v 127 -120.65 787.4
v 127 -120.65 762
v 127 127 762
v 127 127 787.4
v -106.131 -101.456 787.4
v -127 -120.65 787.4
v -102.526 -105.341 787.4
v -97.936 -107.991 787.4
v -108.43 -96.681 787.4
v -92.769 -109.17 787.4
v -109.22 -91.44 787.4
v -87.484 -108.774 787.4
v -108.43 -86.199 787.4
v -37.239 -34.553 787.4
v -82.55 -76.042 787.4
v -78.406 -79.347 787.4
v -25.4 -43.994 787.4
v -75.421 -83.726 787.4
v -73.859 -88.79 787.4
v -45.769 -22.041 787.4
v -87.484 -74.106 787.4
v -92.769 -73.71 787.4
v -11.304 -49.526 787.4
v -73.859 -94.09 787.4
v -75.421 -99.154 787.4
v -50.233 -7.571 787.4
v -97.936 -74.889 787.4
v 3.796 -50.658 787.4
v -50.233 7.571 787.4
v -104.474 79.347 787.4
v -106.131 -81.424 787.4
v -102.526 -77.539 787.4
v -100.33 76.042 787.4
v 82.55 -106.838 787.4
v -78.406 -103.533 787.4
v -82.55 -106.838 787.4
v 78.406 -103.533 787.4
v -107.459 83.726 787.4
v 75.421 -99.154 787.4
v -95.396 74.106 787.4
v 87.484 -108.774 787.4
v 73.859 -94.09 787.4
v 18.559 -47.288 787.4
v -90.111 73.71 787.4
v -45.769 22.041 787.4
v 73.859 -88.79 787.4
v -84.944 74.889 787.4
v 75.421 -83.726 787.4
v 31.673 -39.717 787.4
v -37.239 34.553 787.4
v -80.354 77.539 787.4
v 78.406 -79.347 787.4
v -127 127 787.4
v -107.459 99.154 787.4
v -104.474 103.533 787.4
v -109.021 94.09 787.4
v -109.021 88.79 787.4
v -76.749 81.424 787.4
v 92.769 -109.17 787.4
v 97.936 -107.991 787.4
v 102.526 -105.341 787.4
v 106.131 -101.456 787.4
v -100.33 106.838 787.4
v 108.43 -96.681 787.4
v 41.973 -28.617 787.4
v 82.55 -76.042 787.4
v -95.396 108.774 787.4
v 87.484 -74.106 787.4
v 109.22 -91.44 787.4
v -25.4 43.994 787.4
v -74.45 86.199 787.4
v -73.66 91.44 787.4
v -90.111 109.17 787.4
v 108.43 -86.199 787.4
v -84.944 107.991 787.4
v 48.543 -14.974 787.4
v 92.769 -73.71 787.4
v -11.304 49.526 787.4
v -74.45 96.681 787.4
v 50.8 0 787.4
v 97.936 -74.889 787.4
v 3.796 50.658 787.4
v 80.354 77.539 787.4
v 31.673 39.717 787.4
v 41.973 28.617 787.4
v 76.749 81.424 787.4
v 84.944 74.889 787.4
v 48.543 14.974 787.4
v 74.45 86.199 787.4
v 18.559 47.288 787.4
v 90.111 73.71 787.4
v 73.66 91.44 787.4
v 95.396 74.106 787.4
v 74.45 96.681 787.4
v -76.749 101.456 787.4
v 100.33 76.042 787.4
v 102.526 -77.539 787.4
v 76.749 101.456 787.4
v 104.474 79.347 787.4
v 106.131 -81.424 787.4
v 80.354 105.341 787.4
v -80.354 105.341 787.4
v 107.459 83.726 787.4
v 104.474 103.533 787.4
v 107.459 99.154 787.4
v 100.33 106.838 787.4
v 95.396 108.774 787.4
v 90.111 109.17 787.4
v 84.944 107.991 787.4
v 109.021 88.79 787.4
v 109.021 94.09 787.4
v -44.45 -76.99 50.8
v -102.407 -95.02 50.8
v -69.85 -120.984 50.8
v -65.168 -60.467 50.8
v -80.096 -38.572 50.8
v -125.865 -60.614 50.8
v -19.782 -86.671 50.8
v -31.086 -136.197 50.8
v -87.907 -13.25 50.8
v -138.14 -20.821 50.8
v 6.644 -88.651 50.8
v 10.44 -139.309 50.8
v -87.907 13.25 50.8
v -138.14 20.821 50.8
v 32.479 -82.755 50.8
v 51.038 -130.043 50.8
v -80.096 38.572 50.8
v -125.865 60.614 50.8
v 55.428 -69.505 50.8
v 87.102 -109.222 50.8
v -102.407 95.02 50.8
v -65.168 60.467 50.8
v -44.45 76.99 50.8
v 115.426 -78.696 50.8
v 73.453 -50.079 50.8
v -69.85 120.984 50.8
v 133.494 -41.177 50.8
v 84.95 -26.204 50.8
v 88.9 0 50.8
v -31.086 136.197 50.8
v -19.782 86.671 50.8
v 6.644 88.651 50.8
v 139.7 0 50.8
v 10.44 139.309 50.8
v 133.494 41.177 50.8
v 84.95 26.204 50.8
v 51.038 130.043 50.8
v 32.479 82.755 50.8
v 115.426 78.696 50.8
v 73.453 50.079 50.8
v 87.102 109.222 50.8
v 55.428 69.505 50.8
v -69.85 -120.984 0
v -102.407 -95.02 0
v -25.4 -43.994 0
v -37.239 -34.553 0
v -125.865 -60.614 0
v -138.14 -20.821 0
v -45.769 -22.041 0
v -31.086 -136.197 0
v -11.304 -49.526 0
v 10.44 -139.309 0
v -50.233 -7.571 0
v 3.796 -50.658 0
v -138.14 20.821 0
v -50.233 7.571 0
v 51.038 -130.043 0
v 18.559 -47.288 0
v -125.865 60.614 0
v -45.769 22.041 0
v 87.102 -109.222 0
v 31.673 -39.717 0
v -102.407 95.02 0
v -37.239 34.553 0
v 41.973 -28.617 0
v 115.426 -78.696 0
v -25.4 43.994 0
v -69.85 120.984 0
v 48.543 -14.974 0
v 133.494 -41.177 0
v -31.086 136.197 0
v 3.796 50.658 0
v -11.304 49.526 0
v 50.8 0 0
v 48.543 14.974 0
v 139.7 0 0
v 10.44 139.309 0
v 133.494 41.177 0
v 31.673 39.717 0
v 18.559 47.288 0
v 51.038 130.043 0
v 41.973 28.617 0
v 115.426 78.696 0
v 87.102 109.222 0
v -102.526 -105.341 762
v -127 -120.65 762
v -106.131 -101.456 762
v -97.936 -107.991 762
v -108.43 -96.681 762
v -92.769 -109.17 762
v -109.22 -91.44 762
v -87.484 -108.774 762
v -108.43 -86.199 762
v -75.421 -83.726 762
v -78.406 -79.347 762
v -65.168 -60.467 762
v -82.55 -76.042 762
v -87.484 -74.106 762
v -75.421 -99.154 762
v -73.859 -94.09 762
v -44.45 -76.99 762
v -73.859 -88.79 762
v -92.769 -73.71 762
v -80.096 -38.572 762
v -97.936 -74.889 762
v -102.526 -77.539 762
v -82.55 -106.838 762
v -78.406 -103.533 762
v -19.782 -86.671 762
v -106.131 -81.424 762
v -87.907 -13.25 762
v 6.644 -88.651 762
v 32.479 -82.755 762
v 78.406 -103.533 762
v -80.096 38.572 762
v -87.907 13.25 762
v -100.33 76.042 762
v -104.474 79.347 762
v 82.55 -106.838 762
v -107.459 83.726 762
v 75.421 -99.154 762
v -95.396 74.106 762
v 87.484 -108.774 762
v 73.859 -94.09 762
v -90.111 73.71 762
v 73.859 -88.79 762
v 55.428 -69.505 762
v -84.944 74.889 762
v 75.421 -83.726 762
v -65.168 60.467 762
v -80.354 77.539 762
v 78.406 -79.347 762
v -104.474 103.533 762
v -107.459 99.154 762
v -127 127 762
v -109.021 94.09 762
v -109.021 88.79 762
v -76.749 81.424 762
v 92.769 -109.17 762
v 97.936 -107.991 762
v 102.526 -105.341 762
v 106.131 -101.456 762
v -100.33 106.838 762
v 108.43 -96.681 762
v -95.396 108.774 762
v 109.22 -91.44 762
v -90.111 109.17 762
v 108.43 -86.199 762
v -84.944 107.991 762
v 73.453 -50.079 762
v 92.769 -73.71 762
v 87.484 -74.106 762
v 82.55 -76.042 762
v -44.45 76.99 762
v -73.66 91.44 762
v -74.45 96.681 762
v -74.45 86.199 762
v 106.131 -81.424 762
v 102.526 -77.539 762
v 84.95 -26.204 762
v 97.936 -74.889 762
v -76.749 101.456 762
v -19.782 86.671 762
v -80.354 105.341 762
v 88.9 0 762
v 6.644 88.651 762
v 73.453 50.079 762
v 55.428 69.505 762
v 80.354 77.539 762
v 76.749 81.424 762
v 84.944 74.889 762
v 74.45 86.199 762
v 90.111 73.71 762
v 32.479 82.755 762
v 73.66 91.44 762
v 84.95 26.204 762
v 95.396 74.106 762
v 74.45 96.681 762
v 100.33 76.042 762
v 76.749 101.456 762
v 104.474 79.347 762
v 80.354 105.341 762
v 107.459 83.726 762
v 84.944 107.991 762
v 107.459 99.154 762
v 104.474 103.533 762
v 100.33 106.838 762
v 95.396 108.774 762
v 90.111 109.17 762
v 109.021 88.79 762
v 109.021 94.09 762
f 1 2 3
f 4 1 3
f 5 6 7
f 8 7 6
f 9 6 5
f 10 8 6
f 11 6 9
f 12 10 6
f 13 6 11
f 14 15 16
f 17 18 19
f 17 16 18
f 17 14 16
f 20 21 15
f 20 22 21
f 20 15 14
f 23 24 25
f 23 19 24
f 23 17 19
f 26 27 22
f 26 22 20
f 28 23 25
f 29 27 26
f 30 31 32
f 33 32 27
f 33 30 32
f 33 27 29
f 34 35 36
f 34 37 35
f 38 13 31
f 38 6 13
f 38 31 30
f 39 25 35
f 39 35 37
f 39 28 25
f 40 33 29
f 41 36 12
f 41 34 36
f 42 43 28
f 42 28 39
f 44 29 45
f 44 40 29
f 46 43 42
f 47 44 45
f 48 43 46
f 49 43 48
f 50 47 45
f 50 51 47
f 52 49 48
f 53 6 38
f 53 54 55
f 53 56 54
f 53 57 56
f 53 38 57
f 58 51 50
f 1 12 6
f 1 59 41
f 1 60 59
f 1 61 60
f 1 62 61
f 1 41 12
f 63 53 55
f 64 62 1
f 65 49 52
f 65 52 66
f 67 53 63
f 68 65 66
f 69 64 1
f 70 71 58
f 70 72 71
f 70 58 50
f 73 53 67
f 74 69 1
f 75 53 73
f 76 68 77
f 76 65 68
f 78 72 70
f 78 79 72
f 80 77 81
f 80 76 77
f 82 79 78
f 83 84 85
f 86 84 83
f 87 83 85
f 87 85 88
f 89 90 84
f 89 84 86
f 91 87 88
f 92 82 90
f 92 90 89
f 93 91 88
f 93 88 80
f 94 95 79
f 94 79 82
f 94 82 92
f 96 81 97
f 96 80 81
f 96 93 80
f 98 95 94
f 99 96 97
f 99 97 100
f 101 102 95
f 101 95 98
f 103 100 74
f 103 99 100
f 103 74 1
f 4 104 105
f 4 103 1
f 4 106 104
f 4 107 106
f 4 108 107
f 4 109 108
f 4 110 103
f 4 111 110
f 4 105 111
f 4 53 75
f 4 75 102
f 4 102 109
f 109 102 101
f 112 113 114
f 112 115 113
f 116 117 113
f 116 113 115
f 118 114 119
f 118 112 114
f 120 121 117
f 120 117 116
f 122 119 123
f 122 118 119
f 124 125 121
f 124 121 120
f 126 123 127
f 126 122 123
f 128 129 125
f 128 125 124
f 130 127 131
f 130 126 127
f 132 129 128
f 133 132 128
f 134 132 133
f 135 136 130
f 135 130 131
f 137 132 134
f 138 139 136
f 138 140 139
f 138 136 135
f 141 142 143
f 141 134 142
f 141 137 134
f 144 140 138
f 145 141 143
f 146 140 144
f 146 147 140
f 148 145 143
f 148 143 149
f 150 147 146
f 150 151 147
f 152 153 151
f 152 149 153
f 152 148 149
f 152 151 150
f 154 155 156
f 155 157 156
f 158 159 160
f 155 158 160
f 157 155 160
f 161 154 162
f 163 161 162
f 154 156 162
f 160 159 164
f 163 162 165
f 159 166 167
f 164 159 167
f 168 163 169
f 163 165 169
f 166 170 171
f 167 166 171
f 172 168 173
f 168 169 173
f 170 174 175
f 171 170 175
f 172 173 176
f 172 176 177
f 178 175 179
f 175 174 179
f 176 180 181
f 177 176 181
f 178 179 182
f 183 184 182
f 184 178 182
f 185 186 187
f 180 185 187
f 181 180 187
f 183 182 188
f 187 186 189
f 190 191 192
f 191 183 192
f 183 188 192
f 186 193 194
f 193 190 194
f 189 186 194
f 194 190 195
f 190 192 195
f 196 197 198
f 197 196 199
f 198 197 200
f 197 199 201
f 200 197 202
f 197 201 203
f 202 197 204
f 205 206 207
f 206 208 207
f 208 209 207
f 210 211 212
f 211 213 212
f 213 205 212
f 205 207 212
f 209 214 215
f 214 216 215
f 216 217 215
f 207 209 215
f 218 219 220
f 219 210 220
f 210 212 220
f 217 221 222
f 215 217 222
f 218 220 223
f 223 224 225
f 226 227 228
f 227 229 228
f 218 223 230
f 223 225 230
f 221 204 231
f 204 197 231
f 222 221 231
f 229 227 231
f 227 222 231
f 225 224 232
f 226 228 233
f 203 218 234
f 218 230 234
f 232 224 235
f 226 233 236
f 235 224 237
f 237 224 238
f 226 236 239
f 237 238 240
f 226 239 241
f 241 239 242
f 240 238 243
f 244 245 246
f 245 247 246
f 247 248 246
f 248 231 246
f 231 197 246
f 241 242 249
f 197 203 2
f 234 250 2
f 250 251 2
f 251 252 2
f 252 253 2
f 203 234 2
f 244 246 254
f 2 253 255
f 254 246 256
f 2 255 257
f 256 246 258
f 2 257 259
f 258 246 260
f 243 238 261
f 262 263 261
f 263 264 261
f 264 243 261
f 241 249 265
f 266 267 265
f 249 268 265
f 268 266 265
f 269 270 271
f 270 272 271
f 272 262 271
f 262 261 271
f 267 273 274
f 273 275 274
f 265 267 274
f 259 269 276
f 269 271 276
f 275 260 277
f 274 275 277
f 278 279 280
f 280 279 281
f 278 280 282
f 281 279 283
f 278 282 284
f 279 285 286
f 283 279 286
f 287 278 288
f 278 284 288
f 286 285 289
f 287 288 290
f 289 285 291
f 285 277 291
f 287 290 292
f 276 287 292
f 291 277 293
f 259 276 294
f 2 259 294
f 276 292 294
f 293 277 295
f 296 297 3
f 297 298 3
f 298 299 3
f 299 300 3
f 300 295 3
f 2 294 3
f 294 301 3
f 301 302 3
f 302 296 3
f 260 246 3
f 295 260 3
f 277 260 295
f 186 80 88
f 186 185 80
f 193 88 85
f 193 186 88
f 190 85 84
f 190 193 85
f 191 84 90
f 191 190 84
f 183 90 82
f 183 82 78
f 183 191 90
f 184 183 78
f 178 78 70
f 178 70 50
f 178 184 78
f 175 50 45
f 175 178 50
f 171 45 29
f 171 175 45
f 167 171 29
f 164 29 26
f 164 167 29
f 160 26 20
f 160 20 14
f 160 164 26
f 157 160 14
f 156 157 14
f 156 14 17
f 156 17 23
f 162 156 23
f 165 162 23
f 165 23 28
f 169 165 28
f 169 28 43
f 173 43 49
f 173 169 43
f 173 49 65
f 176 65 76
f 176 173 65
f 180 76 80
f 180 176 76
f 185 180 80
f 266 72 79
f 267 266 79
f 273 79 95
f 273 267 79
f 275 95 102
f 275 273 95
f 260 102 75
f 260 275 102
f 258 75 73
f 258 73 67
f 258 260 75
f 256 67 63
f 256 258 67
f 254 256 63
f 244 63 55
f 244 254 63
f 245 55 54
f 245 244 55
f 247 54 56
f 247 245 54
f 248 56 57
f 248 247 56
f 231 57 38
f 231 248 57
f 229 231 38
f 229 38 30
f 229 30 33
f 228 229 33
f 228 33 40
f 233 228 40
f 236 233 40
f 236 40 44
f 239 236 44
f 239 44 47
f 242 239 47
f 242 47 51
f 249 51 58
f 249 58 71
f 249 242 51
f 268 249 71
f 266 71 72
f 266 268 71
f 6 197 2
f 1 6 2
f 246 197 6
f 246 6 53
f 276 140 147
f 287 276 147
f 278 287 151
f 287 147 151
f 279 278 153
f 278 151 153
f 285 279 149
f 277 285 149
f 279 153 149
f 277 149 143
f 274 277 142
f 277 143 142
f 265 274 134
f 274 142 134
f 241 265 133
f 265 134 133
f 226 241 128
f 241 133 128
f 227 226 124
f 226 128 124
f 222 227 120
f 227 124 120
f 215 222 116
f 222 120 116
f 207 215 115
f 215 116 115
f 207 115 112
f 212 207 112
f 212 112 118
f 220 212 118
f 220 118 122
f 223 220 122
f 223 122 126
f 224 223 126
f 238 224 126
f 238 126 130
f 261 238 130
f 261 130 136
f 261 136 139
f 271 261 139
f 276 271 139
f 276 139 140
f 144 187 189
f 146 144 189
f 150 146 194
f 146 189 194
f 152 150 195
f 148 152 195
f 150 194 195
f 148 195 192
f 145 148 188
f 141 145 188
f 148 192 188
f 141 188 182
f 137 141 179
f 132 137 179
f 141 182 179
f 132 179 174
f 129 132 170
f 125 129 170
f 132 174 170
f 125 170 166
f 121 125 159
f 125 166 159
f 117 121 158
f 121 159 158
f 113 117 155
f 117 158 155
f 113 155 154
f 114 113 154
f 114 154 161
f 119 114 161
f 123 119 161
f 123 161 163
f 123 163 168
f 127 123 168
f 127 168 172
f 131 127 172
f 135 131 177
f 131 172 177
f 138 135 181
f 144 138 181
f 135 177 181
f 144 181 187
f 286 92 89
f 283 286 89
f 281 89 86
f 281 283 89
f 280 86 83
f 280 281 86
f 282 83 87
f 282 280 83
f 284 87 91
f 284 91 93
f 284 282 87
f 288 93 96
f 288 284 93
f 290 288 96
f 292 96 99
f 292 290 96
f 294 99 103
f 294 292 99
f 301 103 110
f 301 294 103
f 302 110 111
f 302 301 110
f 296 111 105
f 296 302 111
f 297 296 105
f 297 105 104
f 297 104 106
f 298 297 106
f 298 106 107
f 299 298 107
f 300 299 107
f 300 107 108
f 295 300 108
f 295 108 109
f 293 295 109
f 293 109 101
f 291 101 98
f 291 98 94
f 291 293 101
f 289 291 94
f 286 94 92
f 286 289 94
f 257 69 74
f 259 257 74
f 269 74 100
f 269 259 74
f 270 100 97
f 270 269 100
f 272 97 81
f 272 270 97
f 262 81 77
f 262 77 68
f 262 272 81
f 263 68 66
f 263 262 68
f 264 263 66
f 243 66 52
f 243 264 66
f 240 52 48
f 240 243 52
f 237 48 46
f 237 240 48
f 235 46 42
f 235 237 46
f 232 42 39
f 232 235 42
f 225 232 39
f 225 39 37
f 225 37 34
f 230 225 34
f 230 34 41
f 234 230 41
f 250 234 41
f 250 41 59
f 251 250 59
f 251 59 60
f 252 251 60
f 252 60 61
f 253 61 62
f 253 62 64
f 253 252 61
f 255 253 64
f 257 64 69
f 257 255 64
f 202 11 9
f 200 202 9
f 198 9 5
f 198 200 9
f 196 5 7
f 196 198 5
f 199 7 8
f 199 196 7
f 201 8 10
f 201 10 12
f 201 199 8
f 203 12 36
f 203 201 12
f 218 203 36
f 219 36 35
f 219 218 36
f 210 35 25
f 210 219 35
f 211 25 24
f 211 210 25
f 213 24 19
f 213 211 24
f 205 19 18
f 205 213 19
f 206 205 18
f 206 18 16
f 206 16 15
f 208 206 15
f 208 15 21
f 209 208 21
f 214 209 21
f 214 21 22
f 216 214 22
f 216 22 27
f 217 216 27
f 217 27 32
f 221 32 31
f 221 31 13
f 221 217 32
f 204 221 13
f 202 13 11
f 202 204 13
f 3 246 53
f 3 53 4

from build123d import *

# Parameters (mm, degrees)
SKETCH1_R           = 139.7
SKETCH1_R_2         = 88.9
BOSS_EXTRUDE3_DEPTH = 50.8
SKETCH1_4_R         = 88.9
SKETCH1_4_R_2       = 50.8
BOSS_EXTRUDE4_DEPTH = 762
SKETCH3_W           = 254
SKETCH3_H           = 247.65
SKETCH3_R           = 17.78
SKETCH3_R_2         = 50.8
BOSS_EXTRUDE5_DEPTH = 25.4


with BuildPart() as part:
    # Sketch1 → Boss-Extrude3 (new body)
    with BuildSketch(Plane.XY):
        Circle(SKETCH1_R)
        Circle(SKETCH1_R_2, mode=Mode.SUBTRACT)
    extrude(amount=BOSS_EXTRUDE3_DEPTH)

    # Sketch1<4> → Boss-Extrude4 (add)
    with BuildSketch(Plane.XY):
        Circle(SKETCH1_4_R)
        Circle(SKETCH1_4_R_2, mode=Mode.SUBTRACT)
    extrude(amount=BOSS_EXTRUDE4_DEPTH)

    # Sketch3 → Boss-Extrude5 (add)
    with BuildSketch(Plane.XY.offset(762)):
        with Locations((0, 3.175)):
            Rectangle(SKETCH3_W, SKETCH3_H)
        with Locations((-91.44, 91.44)):
            Circle(SKETCH3_R, mode=Mode.SUBTRACT)
        with Locations((91.44, 91.44)):
            Circle(SKETCH3_R, mode=Mode.SUBTRACT)
        with Locations((91.44, -91.44)):
            Circle(SKETCH3_R, mode=Mode.SUBTRACT)
        with Locations((-91.44, -91.44)):
            Circle(SKETCH3_R, mode=Mode.SUBTRACT)
        Circle(SKETCH3_R_2, mode=Mode.SUBTRACT)
    extrude(amount=BOSS_EXTRUDE5_DEPTH)


solid = part.part
